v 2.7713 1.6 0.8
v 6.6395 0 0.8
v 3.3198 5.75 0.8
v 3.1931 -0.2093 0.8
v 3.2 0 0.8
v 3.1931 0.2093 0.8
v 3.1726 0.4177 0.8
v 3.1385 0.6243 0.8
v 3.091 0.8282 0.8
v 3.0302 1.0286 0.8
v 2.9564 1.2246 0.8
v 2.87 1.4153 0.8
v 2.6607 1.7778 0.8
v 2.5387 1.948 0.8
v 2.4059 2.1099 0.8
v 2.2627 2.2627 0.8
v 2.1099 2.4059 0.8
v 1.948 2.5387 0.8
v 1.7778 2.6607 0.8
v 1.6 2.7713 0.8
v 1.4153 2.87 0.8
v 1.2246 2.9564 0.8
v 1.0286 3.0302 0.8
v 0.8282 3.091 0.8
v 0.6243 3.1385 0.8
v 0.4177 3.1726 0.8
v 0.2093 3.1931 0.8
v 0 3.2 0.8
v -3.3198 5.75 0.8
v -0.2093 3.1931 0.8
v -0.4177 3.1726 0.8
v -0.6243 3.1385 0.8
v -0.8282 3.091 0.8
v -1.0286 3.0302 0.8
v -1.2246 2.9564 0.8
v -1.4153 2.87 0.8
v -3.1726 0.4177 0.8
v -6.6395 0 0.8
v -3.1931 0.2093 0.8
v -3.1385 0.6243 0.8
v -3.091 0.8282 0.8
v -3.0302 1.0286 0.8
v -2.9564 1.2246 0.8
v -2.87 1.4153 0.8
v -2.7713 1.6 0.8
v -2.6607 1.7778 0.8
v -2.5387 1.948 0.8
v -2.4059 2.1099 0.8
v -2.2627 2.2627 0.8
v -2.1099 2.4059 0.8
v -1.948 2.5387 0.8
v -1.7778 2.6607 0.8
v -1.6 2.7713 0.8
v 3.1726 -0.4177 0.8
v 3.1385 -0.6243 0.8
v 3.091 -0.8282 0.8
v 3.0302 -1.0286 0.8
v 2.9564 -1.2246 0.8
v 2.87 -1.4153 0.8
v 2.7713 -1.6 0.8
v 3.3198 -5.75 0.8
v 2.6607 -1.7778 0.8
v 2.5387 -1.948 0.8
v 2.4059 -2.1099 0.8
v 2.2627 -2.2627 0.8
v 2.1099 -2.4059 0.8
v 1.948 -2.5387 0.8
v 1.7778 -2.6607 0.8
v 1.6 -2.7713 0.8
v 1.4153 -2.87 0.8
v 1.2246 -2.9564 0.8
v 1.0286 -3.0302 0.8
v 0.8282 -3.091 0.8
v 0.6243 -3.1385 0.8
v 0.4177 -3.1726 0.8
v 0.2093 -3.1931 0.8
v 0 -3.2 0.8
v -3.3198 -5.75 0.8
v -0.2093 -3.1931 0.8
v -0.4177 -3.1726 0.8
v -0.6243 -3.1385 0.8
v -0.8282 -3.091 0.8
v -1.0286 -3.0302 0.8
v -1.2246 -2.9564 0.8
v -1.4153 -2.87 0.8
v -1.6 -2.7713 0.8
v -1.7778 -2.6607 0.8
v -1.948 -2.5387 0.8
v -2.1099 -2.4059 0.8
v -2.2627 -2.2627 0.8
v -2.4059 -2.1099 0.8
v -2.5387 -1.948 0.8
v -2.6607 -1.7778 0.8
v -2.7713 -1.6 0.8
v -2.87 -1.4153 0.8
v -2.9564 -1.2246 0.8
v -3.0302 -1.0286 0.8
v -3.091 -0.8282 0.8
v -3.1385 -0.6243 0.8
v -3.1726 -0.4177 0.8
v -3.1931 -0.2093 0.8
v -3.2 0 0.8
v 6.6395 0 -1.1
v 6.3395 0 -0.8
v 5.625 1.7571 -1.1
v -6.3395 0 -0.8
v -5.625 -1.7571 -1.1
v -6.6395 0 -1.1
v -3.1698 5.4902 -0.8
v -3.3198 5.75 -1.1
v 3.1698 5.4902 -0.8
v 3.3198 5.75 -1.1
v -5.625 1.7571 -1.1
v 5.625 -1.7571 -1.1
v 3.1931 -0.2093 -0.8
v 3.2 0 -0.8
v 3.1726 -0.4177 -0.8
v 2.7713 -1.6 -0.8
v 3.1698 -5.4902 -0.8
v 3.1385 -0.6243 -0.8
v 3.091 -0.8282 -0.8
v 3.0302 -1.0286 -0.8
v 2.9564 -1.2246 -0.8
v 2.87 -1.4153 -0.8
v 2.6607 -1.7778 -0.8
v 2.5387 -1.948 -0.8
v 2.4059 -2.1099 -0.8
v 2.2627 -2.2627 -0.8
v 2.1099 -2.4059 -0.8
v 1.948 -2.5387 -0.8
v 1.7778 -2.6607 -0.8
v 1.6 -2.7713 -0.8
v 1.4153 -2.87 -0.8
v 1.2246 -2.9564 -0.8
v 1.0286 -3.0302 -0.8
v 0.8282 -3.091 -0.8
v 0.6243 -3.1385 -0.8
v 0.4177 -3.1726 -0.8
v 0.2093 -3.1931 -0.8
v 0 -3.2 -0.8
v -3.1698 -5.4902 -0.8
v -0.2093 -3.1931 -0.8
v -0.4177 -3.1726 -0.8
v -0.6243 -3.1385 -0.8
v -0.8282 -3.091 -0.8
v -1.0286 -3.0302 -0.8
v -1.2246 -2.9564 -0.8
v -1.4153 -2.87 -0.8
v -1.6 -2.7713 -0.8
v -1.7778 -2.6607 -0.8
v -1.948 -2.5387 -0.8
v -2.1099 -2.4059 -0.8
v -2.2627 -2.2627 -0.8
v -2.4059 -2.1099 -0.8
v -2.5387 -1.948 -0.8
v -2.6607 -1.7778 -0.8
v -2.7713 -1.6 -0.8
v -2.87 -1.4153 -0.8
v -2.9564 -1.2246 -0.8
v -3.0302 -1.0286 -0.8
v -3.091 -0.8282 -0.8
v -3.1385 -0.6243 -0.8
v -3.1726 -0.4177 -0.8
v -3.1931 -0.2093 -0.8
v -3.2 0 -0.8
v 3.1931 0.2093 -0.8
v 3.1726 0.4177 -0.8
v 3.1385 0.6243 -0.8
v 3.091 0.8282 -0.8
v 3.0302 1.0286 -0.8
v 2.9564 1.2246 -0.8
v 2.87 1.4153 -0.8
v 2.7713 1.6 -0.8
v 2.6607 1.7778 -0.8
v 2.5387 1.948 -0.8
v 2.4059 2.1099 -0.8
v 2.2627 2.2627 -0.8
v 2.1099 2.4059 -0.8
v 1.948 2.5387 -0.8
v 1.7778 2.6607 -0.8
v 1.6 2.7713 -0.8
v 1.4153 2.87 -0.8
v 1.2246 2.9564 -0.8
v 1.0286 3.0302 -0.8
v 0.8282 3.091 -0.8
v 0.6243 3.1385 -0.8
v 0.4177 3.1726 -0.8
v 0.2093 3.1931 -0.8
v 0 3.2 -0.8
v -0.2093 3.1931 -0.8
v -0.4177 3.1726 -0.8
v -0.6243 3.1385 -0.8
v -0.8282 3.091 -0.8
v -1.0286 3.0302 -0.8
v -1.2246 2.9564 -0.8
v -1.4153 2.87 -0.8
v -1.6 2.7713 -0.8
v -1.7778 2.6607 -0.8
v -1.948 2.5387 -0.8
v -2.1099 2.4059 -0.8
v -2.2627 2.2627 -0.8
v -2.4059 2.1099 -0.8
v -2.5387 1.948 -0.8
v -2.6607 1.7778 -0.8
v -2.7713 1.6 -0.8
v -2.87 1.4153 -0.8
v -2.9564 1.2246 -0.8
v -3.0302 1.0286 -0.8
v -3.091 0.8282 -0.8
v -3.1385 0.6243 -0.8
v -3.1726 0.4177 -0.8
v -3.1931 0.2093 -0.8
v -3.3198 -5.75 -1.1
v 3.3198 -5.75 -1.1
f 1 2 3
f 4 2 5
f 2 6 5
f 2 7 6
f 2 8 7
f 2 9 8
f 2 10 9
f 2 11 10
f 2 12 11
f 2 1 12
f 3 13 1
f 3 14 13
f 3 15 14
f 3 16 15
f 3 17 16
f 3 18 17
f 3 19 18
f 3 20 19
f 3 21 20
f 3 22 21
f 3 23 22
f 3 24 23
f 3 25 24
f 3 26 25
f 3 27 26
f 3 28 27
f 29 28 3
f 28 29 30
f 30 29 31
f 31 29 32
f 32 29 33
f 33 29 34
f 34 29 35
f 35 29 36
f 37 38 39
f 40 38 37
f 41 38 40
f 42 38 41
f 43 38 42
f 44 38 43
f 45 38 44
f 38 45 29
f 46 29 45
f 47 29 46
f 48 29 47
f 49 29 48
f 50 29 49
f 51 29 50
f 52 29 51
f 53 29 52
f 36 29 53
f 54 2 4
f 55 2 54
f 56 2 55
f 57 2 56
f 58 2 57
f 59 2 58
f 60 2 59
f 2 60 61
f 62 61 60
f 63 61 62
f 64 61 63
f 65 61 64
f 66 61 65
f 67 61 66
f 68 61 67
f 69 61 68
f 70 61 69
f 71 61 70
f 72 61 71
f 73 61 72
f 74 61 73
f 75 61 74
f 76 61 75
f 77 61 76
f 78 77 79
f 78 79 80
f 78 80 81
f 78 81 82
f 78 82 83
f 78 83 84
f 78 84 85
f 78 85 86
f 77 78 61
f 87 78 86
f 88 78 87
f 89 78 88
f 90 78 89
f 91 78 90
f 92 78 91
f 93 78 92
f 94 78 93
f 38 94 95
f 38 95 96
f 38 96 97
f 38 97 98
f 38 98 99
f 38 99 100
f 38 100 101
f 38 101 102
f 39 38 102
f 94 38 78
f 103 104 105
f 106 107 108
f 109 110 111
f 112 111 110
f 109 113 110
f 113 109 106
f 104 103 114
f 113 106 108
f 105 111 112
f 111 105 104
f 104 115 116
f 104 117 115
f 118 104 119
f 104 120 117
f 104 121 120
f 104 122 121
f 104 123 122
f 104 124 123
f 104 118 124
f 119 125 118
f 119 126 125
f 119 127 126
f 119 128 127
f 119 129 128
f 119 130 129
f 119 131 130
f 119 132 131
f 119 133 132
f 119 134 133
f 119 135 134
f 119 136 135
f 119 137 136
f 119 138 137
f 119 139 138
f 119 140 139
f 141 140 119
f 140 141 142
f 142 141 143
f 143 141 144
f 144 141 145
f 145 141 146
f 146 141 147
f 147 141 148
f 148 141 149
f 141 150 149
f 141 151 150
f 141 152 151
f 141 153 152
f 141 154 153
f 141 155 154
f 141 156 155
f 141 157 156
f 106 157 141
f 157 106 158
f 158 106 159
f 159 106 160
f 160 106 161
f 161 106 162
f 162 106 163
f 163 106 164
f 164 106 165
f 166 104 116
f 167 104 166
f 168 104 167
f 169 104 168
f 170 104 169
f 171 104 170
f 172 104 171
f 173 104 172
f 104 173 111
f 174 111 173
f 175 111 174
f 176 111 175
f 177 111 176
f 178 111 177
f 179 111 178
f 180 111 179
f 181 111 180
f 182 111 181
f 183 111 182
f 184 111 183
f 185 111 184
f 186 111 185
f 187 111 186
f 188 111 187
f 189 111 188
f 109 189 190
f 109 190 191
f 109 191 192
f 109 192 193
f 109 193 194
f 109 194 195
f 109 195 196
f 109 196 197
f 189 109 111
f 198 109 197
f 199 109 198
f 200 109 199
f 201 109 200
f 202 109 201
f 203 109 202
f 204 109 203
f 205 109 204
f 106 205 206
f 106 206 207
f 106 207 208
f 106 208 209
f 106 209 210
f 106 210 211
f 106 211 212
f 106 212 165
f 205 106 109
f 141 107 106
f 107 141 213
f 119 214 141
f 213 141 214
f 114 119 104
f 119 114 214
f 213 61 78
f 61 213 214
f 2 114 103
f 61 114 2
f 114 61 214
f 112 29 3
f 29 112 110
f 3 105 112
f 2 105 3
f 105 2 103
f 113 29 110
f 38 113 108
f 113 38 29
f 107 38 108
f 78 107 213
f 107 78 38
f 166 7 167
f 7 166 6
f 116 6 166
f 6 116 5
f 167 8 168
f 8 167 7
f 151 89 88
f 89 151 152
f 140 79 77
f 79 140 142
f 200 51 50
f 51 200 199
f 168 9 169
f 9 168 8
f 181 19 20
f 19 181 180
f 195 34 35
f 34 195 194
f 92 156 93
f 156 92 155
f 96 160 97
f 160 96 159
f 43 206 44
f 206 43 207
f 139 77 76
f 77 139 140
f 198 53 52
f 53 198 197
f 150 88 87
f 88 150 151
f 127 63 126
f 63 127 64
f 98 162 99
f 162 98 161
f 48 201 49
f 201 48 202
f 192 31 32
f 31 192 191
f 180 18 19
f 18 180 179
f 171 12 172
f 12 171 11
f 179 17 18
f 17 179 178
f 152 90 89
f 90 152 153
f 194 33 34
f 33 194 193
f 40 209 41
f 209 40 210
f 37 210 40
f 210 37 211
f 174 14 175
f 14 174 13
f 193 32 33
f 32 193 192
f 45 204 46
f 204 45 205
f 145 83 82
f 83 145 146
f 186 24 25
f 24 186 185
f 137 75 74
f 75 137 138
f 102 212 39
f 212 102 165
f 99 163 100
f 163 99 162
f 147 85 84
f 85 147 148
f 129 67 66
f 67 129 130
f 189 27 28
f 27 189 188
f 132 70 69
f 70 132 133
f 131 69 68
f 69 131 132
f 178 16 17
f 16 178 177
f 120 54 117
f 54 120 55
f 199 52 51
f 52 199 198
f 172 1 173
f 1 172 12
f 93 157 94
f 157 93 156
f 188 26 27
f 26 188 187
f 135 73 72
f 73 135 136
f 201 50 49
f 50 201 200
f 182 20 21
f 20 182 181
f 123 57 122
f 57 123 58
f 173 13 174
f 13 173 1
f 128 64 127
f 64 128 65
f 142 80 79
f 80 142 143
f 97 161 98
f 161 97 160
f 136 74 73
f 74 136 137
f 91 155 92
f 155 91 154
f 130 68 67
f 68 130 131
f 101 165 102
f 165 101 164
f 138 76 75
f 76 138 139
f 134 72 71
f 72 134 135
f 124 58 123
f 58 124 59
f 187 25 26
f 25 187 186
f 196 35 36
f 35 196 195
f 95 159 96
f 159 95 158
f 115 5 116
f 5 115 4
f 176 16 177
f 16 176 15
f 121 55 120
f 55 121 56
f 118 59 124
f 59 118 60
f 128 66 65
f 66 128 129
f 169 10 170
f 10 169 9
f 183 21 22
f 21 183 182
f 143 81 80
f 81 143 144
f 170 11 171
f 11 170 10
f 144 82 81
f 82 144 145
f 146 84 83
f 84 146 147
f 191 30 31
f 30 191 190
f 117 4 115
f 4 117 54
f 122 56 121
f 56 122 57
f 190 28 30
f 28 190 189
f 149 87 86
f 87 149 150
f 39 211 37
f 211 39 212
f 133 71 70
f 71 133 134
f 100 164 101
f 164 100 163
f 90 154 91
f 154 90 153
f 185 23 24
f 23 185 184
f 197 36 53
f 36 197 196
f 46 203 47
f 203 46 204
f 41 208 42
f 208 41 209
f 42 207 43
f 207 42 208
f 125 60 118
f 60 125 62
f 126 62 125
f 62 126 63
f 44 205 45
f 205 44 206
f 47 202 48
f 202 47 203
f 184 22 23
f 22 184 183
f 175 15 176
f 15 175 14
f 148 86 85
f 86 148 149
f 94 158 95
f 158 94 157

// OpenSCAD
// Hex nut for 6.0mm screws, 11.5mm across flats, 3.0mm thick
thread_nominal_diameter_mm = 6.0;
across_flats_mm = 11.5;
thickness_mm = 3.0;

// 0 = clearance hole, 1 = simple thread-representation bore
hole_type = 0;
clearance_hole_diameter_mm = 6.4;
thread_pitch_mm = 1.0;

// Small edge break (not a full conical chamfer that destroys the hex)
chamfer_mm = 0.3;

// Robust boolean overlap
overlap_mm = 0.8;

function hex_circumradius_from_flats(af) = af / sqrt(3); // R = AF / (2*cos30) = AF/sqrt(3)

module hex_prism(af, h) {
    cylinder(h=h, r=hex_circumradius_from_flats(af), center=true, $fn=6);
}

module hex_nut_body(af, h, edge_break) {
    // Keep a true hex outer profile; add a small 45° edge break by subtracting
    // shallow frustums (still hex, not cones to a point).
    difference() {
        hex_prism(af, h);

        if (edge_break > 0) {
            // Top edge break
            translate([0, 0,  h/2 - edge_break/2])
                cylinder(
                    h=edge_break + overlap_mm,
                    r1=hex_circumradius_from_flats(af) + overlap_mm,
                    r2=hex_circumradius_from_flats(af) - edge_break,
                    center=true,
                    $fn=6
                );

            // Bottom edge break
            translate([0, 0, -h/2 + edge_break/2])
                cylinder(
                    h=edge_break + overlap_mm,
                    r1=hex_circumradius_from_flats(af) + overlap_mm,
                    r2=hex_circumradius_from_flats(af) - edge_break,
                    center=true,
                    $fn=6
                );
        }
    }
}

module bore(h) {
    // Clean circular bore (not polygonal)
    bore_d =
        (hole_type == 0)
        ? clearance_hole_diameter_mm
        : (thread_nominal_diameter_mm - 0.65 * thread_pitch_mm);

    cylinder(h=h, r=bore_d/2, center=true, $fn=96);
}

module hex_nut() {
    difference() {
        hex_nut_body(across_flats_mm, thickness_mm, chamfer_mm);
        bore(thickness_mm + 2*overlap_mm);
    }
}

hex_nut();
